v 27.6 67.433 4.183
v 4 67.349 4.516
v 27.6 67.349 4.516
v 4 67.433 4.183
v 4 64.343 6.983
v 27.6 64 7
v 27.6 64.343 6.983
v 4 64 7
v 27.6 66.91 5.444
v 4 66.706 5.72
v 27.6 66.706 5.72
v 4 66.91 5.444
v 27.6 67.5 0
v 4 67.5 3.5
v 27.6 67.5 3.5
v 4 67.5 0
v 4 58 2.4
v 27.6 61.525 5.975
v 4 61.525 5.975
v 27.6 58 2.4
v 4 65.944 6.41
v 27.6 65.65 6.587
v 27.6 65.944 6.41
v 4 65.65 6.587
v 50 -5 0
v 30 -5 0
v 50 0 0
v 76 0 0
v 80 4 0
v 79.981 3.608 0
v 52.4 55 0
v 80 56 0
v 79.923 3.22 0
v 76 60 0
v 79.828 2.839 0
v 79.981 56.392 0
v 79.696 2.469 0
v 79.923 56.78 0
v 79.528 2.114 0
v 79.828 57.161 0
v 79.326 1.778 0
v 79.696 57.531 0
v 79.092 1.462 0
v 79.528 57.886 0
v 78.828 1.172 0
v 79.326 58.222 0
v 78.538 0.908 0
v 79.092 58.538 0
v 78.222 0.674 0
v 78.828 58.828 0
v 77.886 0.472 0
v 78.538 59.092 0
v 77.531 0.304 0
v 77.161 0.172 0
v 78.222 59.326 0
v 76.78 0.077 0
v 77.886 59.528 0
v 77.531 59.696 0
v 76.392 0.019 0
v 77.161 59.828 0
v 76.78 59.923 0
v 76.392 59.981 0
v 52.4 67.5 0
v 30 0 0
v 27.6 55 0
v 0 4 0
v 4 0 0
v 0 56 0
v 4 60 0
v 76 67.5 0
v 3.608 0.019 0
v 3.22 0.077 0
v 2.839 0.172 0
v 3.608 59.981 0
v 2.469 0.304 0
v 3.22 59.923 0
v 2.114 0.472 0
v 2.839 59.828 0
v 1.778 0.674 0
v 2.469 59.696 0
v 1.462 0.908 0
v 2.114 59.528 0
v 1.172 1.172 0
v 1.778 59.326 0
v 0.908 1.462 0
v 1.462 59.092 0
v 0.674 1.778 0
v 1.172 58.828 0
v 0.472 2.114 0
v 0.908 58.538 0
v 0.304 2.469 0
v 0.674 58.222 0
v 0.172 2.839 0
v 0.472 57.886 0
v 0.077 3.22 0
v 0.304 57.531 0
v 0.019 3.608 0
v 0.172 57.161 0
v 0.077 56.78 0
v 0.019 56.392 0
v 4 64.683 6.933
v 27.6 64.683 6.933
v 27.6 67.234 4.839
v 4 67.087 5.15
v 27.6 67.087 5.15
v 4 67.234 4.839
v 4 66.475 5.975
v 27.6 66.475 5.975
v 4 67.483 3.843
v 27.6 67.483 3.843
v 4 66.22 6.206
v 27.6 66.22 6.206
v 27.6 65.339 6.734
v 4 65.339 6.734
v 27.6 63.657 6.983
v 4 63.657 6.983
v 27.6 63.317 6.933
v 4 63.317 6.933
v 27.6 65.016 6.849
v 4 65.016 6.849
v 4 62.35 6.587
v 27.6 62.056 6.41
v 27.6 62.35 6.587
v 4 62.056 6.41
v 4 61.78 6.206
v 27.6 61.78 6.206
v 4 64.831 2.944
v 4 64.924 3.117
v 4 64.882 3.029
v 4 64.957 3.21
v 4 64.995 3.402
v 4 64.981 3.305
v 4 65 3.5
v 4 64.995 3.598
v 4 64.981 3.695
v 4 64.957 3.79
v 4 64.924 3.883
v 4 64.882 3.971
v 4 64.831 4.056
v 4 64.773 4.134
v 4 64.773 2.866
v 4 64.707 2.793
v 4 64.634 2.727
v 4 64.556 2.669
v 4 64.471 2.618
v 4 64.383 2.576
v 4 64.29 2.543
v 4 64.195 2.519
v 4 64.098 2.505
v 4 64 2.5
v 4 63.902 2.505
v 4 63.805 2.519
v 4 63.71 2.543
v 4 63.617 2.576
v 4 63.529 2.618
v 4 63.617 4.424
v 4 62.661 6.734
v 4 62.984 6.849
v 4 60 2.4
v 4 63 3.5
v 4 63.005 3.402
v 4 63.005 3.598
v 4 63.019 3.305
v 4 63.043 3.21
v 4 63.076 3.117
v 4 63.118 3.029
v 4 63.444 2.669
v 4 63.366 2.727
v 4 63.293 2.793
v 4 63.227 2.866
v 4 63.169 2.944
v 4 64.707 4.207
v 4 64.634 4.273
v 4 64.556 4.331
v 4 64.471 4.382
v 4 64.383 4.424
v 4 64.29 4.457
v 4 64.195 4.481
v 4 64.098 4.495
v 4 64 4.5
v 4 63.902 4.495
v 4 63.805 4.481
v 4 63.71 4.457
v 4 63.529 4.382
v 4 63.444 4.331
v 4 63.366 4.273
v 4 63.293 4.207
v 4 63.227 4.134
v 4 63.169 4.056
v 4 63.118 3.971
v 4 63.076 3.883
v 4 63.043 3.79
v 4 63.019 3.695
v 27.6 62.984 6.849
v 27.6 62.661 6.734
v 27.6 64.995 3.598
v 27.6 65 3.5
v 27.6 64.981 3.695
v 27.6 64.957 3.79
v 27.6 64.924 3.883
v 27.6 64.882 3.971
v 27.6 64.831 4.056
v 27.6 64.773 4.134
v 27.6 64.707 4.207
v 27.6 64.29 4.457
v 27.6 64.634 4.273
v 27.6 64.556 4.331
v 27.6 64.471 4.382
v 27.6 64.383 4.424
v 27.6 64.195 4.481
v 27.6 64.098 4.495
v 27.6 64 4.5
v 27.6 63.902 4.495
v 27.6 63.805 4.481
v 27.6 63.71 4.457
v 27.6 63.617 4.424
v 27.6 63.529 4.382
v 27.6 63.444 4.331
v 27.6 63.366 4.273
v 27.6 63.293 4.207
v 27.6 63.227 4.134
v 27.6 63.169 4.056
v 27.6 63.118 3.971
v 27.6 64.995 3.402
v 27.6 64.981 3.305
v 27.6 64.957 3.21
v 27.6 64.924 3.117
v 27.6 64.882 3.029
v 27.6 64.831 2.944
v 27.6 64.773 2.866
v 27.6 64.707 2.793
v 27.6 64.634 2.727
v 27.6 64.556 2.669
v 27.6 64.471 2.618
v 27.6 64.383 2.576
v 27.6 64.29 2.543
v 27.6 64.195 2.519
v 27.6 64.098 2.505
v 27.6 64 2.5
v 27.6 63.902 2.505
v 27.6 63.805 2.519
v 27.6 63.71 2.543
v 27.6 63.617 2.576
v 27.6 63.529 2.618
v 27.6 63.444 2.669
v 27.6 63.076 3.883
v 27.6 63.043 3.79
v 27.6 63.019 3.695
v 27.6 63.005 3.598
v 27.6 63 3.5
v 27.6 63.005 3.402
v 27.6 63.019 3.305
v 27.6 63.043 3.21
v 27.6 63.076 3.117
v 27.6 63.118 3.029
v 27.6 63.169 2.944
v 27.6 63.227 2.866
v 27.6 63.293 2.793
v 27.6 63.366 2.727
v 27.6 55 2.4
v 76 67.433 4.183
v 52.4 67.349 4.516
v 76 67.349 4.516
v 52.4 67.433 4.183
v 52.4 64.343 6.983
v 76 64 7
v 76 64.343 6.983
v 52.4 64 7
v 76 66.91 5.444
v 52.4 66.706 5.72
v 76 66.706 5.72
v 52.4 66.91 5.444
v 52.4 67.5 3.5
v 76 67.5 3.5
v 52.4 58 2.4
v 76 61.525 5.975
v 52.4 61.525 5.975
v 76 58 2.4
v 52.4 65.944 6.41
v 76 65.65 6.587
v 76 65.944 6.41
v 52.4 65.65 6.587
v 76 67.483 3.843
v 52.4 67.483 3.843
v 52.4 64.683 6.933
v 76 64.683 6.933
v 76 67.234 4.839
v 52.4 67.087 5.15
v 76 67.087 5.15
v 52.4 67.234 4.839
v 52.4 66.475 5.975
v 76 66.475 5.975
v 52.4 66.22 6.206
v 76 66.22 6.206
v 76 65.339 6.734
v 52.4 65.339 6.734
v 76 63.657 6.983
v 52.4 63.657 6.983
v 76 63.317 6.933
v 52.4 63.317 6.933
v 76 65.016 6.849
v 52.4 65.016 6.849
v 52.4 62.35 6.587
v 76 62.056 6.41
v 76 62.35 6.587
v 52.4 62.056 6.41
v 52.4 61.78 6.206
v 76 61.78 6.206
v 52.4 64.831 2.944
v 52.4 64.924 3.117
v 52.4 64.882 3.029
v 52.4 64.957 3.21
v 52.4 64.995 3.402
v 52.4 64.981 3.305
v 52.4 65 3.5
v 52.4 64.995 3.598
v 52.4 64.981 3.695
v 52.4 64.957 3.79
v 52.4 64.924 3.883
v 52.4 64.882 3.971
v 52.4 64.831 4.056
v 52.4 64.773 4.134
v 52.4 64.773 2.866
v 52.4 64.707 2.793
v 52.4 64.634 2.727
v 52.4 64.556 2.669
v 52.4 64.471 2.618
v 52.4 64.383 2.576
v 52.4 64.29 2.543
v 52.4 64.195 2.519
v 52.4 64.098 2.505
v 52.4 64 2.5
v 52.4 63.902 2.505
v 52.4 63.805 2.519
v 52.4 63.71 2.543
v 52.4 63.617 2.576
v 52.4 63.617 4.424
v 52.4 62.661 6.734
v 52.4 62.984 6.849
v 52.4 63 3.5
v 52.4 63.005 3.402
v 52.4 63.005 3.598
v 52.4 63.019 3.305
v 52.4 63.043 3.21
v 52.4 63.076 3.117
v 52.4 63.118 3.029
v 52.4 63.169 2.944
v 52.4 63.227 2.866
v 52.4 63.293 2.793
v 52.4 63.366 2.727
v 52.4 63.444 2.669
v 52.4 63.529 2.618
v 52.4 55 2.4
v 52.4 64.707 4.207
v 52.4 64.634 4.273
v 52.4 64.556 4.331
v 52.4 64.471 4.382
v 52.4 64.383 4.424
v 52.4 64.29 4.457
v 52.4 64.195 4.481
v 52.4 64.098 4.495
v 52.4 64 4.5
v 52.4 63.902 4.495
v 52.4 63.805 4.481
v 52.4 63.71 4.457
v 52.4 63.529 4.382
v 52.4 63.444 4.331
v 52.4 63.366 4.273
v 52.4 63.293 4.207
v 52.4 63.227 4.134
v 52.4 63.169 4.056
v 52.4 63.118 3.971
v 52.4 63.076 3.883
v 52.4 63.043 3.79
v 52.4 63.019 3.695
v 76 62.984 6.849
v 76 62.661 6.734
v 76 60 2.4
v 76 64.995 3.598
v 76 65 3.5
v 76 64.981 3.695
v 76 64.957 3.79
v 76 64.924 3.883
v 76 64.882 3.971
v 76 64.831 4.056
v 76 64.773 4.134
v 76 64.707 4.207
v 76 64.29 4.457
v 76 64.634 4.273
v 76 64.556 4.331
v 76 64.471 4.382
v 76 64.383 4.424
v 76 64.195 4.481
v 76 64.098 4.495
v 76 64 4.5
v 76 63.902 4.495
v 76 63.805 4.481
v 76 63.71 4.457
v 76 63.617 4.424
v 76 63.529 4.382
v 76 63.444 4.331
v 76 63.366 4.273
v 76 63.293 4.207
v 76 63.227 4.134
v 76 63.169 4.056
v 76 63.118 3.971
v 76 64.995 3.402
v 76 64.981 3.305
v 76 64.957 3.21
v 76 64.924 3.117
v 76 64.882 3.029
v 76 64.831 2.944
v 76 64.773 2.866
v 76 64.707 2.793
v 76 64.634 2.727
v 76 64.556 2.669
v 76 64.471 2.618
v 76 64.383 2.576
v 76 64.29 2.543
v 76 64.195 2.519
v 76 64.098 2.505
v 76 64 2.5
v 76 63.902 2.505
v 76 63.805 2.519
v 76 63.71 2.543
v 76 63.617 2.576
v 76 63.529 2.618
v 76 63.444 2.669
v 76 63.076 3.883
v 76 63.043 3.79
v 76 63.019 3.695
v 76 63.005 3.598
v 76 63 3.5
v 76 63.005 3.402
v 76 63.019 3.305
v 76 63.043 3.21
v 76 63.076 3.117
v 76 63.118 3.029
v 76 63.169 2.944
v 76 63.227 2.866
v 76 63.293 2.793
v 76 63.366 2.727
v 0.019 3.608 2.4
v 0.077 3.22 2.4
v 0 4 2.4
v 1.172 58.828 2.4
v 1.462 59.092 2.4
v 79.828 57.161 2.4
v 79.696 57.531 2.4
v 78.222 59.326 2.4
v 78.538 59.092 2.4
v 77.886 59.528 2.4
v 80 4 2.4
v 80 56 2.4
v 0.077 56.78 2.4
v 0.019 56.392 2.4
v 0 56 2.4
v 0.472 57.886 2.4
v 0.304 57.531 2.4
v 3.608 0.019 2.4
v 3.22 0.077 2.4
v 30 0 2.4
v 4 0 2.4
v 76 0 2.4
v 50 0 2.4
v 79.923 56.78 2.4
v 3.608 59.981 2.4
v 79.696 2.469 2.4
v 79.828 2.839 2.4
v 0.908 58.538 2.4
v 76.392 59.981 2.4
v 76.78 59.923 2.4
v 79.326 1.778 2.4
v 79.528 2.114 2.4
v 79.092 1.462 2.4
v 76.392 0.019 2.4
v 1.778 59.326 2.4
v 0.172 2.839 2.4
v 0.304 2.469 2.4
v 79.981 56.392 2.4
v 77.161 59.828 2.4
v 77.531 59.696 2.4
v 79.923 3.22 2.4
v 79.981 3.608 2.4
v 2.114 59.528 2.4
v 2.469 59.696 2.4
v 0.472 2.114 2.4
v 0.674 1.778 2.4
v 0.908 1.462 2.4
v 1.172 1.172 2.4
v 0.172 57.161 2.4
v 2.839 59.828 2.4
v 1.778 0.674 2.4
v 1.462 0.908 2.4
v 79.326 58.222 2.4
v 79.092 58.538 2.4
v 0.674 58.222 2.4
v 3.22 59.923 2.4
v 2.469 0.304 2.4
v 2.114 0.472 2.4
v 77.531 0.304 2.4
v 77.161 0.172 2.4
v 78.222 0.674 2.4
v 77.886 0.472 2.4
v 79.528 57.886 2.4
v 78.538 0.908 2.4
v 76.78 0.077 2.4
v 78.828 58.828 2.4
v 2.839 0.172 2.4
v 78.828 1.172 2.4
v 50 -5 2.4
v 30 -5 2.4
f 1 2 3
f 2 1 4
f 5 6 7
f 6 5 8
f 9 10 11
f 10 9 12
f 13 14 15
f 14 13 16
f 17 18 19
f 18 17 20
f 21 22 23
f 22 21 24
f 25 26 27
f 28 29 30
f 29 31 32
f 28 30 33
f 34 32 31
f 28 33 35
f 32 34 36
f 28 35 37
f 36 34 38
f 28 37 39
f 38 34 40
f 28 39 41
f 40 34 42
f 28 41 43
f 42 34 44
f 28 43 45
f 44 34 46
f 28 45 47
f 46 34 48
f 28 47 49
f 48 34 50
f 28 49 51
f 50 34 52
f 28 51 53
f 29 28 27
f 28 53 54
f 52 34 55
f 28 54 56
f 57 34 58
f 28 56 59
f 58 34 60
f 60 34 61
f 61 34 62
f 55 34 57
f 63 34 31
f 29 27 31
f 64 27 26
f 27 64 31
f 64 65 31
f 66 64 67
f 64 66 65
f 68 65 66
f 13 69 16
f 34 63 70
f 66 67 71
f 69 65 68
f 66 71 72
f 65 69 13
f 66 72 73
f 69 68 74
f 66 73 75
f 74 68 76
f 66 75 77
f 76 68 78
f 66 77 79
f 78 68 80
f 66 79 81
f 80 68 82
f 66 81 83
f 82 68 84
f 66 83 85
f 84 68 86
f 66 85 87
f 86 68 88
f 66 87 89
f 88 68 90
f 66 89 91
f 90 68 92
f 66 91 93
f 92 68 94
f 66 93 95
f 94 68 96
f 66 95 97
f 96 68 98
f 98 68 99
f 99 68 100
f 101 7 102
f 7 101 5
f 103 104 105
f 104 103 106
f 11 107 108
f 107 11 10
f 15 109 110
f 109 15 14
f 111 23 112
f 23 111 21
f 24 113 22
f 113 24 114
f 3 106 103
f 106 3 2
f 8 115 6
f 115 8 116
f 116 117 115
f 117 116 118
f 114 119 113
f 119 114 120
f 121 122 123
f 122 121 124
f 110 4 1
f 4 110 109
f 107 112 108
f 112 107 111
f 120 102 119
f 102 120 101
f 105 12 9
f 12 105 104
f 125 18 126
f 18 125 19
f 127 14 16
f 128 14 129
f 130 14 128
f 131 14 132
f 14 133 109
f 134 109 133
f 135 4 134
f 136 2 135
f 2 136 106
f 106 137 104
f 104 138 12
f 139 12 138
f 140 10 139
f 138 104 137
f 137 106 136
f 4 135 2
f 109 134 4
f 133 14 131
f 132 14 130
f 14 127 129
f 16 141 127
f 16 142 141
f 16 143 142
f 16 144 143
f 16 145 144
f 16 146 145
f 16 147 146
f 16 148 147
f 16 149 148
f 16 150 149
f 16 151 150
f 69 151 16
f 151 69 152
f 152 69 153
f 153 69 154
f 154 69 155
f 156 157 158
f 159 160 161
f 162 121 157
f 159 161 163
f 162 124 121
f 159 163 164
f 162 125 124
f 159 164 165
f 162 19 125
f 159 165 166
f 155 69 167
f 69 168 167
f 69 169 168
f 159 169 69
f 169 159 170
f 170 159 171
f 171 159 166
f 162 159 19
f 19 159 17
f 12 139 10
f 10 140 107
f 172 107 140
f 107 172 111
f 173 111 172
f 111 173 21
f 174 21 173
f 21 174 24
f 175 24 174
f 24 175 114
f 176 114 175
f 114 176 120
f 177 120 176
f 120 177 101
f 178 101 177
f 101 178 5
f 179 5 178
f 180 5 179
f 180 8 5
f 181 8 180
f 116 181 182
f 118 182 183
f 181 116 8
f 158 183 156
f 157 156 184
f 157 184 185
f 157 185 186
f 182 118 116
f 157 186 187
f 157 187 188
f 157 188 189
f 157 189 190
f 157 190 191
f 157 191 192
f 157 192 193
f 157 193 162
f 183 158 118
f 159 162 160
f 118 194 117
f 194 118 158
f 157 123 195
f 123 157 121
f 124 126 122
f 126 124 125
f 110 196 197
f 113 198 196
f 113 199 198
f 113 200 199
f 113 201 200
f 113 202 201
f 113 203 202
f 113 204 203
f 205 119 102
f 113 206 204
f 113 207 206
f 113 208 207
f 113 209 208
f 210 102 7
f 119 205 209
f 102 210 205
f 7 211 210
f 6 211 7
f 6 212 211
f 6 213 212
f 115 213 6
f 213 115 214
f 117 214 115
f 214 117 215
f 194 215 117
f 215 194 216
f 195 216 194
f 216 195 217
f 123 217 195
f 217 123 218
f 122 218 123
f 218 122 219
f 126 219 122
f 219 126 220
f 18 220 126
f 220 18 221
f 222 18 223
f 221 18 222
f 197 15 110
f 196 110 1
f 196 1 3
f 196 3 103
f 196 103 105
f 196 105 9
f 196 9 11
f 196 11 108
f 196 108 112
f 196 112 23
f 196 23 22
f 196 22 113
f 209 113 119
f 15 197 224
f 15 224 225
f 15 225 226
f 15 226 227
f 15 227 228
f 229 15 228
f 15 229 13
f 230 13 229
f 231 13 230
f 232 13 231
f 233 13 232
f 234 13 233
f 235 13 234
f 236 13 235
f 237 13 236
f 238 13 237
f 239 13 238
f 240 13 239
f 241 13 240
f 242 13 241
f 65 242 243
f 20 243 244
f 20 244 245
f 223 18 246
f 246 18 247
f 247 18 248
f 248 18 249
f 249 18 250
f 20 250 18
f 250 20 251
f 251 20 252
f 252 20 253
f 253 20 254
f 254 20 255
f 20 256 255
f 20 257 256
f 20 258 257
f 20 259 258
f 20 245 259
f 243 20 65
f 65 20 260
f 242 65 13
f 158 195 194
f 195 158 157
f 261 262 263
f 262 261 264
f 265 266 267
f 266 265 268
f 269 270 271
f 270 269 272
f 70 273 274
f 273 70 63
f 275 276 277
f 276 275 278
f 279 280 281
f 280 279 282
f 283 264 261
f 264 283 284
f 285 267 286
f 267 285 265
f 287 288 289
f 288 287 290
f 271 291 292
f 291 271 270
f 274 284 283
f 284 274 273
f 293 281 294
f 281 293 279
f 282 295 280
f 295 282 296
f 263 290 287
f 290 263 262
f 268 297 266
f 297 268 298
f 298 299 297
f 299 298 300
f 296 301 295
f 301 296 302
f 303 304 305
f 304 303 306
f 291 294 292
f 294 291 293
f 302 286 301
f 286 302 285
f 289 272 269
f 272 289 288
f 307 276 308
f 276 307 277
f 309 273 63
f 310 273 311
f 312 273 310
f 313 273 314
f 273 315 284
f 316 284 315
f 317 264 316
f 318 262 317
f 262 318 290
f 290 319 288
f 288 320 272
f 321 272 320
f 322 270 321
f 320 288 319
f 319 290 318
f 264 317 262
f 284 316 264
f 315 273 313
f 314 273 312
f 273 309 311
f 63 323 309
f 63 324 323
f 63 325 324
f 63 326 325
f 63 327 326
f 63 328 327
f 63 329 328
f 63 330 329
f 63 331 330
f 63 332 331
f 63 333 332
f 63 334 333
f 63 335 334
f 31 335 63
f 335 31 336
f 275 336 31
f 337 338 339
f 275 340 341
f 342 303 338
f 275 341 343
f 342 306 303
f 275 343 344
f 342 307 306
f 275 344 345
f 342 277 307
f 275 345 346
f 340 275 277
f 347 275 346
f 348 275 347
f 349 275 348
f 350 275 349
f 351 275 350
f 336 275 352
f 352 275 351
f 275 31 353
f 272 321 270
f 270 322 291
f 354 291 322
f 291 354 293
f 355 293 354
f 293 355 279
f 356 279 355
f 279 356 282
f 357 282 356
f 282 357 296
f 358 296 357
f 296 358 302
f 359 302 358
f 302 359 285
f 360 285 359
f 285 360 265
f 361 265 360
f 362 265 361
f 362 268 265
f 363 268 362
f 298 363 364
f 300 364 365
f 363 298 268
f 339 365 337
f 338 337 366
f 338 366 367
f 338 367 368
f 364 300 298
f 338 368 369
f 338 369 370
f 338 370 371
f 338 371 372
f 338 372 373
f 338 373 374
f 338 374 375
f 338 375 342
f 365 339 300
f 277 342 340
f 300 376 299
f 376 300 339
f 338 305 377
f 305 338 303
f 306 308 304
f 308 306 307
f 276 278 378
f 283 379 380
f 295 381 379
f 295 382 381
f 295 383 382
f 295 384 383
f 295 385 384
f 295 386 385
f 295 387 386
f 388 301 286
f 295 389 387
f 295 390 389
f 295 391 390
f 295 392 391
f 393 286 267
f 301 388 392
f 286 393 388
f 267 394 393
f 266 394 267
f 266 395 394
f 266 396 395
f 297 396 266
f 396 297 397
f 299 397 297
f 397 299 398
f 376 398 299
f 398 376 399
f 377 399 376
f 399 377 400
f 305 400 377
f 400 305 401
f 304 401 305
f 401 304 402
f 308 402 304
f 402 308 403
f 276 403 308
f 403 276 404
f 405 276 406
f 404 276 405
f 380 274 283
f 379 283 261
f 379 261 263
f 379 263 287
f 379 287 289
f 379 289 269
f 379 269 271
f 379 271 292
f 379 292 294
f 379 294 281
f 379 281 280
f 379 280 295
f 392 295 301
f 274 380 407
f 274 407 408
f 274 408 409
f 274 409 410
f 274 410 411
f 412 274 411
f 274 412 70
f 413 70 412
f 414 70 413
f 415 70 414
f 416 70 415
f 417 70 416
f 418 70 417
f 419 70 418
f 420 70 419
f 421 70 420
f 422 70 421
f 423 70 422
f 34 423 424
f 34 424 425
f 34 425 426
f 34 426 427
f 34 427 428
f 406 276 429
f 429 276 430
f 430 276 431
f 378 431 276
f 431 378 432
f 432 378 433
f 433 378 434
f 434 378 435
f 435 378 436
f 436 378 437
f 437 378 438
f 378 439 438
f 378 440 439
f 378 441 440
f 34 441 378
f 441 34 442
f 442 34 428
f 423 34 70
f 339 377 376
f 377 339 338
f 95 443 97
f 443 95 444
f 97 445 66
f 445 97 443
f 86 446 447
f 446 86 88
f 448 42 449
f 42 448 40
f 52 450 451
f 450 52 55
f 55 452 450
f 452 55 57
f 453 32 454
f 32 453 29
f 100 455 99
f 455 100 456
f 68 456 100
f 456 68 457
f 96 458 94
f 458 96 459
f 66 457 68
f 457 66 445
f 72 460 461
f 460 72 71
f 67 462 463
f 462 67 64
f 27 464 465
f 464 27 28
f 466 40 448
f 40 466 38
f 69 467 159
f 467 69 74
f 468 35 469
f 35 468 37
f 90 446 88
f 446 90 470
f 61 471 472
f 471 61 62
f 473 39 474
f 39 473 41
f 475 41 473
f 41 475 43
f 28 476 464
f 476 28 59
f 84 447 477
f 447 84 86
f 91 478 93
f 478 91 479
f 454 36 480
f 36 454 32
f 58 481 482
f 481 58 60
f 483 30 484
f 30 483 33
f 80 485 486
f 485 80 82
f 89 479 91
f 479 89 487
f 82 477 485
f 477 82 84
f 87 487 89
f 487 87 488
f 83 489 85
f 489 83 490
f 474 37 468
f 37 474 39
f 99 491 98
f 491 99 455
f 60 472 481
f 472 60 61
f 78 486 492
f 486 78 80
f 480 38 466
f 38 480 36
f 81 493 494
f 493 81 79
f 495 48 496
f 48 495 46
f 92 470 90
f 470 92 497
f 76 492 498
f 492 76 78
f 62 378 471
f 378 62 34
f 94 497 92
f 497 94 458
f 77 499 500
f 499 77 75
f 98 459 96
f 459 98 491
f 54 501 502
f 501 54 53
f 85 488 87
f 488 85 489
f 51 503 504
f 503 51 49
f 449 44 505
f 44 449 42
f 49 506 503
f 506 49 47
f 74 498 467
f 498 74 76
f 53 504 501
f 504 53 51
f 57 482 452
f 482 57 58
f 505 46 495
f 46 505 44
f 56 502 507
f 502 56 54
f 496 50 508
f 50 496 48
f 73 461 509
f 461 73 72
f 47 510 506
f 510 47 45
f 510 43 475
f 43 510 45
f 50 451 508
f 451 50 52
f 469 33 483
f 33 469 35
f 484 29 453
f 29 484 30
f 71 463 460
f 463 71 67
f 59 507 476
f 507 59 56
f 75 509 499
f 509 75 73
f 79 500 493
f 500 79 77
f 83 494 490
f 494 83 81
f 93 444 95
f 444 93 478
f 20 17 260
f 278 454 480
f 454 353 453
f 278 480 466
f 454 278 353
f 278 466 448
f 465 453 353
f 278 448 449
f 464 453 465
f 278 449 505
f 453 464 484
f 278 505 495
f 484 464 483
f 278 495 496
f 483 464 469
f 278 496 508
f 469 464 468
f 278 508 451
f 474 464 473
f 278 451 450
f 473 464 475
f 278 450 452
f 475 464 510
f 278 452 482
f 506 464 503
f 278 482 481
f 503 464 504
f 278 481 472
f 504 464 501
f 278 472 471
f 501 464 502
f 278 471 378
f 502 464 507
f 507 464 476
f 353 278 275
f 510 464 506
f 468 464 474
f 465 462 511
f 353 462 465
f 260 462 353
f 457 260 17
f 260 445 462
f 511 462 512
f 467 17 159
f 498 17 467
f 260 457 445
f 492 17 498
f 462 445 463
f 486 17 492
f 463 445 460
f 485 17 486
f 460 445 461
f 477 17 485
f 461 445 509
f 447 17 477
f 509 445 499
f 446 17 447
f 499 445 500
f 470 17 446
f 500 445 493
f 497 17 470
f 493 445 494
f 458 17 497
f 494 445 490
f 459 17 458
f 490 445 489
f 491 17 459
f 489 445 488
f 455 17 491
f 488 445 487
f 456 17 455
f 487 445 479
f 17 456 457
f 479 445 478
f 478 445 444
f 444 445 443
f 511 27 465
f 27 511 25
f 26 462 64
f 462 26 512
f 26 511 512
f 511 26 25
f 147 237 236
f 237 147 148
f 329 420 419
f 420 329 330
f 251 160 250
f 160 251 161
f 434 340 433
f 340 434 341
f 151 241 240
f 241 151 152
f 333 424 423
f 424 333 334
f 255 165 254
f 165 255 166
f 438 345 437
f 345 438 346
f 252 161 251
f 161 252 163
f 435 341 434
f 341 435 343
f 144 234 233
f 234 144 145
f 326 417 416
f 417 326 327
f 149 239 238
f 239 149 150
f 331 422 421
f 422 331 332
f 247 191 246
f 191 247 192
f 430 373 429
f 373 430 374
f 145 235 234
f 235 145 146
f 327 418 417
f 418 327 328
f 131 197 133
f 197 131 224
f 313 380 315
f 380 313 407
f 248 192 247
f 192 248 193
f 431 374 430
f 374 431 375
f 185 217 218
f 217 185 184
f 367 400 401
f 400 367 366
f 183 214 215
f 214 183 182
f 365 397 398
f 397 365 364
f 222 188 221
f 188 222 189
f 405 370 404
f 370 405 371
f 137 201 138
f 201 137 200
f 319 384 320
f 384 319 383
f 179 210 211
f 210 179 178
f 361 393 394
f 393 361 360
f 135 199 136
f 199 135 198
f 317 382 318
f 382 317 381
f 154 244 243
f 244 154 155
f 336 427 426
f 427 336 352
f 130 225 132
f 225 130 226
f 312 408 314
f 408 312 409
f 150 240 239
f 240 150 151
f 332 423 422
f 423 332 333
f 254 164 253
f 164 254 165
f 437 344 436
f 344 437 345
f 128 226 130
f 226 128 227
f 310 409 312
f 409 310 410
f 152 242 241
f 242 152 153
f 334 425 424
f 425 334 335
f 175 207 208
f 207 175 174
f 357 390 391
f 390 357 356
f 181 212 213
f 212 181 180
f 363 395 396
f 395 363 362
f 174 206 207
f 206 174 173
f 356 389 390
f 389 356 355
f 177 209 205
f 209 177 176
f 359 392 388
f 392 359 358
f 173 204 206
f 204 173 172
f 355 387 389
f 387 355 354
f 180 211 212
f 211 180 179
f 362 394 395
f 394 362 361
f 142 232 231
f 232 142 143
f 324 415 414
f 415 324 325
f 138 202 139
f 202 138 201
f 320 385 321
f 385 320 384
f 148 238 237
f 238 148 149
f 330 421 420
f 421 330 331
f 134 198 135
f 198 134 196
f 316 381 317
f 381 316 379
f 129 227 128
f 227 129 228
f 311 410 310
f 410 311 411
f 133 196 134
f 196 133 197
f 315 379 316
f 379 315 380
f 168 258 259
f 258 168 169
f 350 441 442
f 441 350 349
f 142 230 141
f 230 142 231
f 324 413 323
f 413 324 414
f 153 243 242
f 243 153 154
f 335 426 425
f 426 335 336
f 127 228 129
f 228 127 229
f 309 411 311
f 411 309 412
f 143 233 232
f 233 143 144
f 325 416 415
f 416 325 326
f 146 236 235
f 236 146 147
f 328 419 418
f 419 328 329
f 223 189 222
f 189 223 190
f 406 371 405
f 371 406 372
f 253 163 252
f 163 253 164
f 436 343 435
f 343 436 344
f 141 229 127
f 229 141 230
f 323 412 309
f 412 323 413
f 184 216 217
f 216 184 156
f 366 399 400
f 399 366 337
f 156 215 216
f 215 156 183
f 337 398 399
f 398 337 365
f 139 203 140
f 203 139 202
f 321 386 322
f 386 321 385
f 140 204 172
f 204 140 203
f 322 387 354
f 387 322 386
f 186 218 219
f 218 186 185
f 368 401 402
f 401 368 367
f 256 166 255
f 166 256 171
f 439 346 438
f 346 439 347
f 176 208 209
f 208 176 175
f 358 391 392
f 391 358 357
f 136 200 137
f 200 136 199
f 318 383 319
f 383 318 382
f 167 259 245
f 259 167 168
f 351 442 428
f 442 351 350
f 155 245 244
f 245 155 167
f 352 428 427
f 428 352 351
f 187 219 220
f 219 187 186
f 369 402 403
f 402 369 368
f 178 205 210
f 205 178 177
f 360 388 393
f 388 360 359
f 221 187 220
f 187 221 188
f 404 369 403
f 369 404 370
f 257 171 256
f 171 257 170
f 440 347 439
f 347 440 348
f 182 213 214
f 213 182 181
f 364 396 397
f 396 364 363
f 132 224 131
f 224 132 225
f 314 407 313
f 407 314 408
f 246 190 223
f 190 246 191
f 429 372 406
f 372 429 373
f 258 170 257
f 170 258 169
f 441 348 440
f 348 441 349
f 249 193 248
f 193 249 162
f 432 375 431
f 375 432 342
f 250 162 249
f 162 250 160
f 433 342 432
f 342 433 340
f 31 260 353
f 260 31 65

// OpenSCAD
// file: ../lib/params.scad
// Shared sizes for the box and its lid (both parts include this file).
/* [Box] */
// Width (mm)
box_w = 80; // [40:1:200]
// Depth (mm)
box_d = 60; // [30:1:200]
// Height without the lid (mm)
box_h = 40; // [15:1:150]
// Wall thickness (mm)
wall = 2; // [1.2:0.2:4]
// Corner radius (mm)
corner = 4; // [1:0.5:10]
// Lid thickness (mm)
lid_t = 2.4; // [1.6:0.2:4]

/* [Hinge] */
// Hinge loop radius (mm)
knuckle_r = 3.5; // [2.5:0.5:6]
// Filament pin hole (mm)
pin_d = 2.0; // [1.8:0.1:2.4]
// Gap between loops (mm)
gap = 0.4; // [0.2:0.05:0.8]
// Lid swing room (mm)
swing_gap = 0.5; // [0.3:0.1:1.5]

/* [Hidden] */
// hinge axis: just behind the back wall (plus swing_gap), a loop radius above the rim
hinge_y = box_d + swing_gap + knuckle_r;
hinge_z = box_h + knuckle_r;
k_len = (box_w - 2 * corner) / 3; // length of each hinge loop

module rounded_rect(w, d, r) {
  hull() for (x = [r, w - r], y = [r, d - r]) translate([x, y]) circle(r);
}
// main file
// Box with a hinged lid: the lid. Printed flat; its two outer hinge loops line up with the box's
// middle loop. A small lip on the underside keeps it closed and centred.

/* [Hidden] */
include <../lib/params.scad>
$fn = $preview ? 32 : 64;

difference() {
  union() {
    linear_extrude(lid_t) rounded_rect(box_w, box_d, corner);
    // two outer hinge loops
    for (x0 = [corner, corner + 2 * k_len + gap])
      translate([x0, 0, 0]) hull() {
        translate([0, box_d - 2, 0]) cube([k_len - gap, 2, lid_t]);
        translate([0, hinge_y, knuckle_r]) rotate([0, 90, 0]) cylinder(r = knuckle_r, h = k_len - gap);
        translate([0, hinge_y - knuckle_r, 0]) cube([k_len - gap, 2 * knuckle_r, 0.01]);
      }
    // finger tab at the front
    translate([box_w / 2 - 10, -5, 0]) cube([20, 6, lid_t]);
  }
  translate([-1, hinge_y, knuckle_r]) rotate([0, 90, 0]) cylinder(d = pin_d, h = box_w + 2);
  // notch behind the box's middle hinge loop so the lid can swing open past it
  translate([corner + k_len - gap, box_d - 5, -1]) cube([k_len + 2 * gap, 20, 20]);
}
